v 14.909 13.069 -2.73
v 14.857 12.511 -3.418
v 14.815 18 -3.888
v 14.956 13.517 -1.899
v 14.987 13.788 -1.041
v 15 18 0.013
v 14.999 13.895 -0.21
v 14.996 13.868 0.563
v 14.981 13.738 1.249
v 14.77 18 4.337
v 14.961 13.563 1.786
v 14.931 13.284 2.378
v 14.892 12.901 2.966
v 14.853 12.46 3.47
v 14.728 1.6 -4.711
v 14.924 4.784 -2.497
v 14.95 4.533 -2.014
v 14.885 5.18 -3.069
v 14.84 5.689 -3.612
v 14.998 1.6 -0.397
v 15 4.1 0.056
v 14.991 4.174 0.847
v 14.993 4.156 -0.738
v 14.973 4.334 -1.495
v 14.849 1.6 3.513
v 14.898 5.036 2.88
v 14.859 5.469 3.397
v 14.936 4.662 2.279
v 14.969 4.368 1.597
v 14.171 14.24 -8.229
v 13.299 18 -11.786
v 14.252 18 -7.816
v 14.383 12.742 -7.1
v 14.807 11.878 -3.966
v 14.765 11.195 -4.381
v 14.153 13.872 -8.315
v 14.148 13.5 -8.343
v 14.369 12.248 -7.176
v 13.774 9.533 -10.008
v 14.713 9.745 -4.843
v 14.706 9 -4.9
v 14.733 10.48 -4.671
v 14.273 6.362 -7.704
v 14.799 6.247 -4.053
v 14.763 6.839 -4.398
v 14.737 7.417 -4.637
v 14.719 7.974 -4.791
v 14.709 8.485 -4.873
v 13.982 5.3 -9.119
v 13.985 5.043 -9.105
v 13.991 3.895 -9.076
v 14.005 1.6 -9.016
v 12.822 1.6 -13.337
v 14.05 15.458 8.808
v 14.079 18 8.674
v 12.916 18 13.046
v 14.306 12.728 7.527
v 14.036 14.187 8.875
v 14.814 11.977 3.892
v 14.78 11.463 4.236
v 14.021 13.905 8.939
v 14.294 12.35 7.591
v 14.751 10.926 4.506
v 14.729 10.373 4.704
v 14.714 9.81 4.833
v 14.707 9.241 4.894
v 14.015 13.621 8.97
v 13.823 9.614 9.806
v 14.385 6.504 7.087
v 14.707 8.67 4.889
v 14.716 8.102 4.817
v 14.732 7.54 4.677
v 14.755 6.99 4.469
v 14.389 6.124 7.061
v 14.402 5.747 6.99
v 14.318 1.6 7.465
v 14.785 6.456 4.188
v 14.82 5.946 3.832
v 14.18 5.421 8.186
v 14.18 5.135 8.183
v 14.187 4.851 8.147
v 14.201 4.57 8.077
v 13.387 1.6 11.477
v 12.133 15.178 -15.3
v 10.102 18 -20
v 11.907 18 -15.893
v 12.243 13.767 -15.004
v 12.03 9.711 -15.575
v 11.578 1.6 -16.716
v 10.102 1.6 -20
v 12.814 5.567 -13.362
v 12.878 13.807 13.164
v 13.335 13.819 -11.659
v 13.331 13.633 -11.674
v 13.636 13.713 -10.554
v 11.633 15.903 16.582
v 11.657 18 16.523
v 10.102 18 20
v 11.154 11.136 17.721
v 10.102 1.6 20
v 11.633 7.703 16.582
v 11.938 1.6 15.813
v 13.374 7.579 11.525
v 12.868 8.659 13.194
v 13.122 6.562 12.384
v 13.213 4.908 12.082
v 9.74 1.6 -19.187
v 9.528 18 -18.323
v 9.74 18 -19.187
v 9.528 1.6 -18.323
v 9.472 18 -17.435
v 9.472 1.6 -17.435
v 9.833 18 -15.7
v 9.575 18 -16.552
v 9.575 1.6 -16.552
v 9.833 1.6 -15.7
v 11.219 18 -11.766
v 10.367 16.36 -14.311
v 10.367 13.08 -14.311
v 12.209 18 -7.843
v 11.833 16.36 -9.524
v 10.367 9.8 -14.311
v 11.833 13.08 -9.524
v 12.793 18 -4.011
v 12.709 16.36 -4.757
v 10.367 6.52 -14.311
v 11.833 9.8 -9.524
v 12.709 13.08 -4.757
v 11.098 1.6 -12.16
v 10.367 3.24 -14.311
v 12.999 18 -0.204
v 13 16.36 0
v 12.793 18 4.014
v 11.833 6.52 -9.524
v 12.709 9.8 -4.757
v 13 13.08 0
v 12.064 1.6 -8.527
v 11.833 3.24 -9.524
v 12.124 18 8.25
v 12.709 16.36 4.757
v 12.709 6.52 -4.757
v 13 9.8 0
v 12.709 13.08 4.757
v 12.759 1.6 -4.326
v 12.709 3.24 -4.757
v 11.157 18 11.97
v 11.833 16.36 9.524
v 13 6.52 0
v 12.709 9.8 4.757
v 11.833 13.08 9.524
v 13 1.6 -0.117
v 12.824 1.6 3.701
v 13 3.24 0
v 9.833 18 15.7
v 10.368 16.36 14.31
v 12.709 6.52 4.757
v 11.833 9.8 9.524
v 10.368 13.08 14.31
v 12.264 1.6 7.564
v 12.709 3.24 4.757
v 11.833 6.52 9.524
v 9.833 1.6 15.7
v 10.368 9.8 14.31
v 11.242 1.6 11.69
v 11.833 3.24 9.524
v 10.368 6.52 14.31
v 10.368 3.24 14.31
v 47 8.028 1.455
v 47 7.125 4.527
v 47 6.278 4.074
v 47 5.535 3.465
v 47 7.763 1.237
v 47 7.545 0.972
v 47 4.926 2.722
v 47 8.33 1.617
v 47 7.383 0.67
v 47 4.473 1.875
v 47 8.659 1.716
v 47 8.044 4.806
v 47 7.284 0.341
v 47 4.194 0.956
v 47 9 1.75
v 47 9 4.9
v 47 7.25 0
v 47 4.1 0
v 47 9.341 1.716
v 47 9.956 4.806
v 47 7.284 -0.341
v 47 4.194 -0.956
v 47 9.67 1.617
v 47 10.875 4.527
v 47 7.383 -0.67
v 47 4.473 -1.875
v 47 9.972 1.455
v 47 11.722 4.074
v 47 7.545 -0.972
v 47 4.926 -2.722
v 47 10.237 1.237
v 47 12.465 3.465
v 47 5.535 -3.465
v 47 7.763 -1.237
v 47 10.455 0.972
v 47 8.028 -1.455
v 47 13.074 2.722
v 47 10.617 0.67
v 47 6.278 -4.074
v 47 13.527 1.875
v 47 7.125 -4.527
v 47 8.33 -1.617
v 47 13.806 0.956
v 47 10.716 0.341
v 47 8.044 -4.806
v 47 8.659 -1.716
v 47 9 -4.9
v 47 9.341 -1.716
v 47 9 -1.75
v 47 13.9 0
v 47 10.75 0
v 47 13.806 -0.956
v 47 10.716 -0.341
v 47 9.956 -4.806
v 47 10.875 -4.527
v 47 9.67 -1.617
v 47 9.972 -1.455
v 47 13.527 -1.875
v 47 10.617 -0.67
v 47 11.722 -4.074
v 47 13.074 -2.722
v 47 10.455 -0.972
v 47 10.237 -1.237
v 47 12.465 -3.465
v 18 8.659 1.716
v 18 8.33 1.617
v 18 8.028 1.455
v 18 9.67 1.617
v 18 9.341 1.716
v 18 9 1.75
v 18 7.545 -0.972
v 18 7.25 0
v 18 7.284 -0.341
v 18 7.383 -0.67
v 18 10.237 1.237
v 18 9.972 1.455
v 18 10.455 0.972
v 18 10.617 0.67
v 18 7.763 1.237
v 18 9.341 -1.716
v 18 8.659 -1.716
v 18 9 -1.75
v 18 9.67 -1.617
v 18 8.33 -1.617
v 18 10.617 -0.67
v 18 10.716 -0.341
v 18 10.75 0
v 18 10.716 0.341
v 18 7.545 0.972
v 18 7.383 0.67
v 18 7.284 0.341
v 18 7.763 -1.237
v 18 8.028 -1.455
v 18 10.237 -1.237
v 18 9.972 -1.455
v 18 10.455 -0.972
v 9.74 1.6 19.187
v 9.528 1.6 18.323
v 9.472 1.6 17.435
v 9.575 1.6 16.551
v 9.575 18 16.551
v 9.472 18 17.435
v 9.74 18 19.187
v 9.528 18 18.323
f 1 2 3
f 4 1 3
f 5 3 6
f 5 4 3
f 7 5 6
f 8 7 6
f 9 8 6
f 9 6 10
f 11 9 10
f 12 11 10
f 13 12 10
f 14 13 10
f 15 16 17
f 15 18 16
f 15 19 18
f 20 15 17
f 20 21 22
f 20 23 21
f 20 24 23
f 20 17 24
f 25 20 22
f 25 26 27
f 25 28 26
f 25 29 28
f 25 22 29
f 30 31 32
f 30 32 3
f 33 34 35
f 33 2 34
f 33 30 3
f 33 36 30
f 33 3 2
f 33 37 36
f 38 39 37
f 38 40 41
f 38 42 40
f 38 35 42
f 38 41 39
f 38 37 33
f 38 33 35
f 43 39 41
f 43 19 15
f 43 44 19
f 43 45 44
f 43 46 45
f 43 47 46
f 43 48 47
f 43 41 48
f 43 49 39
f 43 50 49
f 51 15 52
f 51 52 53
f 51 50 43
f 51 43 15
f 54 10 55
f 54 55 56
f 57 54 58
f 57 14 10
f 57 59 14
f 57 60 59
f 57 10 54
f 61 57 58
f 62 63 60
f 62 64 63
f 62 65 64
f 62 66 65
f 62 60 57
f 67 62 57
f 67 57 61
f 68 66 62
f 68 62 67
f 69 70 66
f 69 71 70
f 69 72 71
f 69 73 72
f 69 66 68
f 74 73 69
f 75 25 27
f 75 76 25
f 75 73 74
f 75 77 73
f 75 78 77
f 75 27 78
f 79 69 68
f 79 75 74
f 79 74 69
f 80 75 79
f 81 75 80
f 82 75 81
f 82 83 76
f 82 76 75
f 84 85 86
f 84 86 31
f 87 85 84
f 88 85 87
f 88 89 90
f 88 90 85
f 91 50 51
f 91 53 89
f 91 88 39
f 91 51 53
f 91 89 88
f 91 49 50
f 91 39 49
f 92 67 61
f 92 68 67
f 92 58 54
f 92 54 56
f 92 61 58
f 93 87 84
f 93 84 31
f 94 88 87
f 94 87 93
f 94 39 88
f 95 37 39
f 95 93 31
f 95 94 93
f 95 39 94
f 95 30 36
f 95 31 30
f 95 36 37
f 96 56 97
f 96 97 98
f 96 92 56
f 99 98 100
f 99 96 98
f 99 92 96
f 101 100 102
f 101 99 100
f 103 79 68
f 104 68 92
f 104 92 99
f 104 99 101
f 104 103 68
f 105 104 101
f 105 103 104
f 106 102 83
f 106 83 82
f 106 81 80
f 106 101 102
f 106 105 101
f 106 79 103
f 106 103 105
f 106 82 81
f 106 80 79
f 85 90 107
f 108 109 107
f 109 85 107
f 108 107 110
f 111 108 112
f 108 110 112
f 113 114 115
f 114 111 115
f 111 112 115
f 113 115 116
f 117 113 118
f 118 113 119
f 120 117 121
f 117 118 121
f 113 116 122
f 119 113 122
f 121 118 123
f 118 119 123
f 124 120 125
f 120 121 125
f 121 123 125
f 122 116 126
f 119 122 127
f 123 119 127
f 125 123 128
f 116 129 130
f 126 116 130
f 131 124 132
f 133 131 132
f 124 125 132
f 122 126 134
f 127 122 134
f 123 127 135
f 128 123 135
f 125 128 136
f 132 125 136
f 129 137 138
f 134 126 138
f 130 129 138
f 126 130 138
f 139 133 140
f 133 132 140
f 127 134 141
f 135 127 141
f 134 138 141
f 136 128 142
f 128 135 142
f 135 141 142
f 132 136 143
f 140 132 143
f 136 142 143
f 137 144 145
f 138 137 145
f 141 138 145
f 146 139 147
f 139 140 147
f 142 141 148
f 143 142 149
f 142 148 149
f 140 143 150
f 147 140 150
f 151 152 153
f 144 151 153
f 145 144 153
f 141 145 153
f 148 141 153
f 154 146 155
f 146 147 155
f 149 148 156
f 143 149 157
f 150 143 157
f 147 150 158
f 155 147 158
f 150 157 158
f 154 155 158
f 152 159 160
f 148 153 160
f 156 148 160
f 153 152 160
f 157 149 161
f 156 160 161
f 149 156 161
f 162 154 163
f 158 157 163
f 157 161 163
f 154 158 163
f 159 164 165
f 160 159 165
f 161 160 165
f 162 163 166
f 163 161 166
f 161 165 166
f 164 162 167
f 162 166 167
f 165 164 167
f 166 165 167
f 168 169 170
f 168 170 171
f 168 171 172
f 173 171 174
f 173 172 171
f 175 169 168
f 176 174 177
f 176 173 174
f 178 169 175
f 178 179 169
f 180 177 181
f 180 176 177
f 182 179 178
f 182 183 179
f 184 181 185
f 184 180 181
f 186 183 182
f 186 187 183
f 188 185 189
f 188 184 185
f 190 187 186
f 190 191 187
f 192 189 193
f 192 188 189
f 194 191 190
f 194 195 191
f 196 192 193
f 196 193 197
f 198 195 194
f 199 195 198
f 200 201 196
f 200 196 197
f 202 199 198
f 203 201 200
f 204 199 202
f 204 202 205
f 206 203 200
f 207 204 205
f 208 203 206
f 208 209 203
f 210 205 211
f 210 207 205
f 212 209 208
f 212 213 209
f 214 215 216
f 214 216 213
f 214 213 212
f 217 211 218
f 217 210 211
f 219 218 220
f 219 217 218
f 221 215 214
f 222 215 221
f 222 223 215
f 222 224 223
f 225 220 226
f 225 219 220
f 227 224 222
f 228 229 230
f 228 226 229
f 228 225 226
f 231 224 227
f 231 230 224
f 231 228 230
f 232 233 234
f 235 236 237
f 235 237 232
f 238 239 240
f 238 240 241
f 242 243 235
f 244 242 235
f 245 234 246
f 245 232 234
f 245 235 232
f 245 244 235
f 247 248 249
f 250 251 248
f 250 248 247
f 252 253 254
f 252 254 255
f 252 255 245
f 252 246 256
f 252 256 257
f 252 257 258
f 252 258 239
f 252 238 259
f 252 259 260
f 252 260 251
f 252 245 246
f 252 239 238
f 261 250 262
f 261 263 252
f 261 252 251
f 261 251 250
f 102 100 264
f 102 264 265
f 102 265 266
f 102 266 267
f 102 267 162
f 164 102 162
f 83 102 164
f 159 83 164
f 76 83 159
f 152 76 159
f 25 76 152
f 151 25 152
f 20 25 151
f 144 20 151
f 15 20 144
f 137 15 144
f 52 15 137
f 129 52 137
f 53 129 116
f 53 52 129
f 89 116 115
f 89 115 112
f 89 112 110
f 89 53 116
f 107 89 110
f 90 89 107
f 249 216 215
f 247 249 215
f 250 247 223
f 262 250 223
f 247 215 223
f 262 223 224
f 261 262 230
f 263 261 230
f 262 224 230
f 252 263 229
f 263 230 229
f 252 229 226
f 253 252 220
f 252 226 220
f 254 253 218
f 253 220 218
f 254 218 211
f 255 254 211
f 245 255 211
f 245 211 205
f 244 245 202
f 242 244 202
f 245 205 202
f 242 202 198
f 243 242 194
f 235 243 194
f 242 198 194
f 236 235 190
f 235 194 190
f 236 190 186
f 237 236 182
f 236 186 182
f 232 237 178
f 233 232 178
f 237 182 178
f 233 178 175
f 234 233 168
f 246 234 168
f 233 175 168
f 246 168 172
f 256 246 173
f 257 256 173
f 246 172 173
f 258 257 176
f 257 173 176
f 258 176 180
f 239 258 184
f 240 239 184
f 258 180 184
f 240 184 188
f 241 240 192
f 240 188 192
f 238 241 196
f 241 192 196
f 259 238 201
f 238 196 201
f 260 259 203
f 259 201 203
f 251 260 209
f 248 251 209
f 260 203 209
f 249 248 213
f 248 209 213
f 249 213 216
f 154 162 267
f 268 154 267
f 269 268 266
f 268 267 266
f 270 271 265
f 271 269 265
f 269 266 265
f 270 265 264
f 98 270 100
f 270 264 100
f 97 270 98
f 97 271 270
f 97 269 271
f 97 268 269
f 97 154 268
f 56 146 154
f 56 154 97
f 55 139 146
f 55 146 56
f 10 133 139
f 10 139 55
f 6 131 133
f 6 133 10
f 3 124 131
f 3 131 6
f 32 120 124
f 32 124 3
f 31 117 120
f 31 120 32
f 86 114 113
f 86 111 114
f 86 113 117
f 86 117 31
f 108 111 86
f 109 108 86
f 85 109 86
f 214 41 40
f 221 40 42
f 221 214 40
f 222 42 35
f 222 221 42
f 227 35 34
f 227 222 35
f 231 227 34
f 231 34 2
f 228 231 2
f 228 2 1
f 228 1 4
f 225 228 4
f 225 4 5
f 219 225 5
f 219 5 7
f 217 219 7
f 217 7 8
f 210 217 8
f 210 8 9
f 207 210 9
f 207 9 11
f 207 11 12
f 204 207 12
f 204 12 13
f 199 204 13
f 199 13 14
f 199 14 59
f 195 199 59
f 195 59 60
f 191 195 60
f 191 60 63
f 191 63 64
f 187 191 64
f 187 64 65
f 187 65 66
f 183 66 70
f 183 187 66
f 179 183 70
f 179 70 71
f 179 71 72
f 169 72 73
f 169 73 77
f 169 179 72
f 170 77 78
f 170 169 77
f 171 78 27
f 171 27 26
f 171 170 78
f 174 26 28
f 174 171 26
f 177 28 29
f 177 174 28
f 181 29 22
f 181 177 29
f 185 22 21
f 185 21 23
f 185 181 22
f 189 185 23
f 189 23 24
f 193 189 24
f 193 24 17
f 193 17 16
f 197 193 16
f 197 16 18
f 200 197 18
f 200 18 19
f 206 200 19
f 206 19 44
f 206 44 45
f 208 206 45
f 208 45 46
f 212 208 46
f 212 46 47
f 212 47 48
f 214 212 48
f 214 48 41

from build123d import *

# Parameters (mm, degrees)
BOSS_EXTRUDE1_DEPTH = 18
BOSS_EXTRUDE2_REACH = 30.6
SKETCH2_R           = 4.9
BOSS_EXTRUDE3_START = 29
SKETCH3_R           = 4.9
BOSS_EXTRUDE3_DEPTH = 29
SKETCH4_R           = 1.75
CUT_EXTRUDE1_DEPTH  = 29
SKETCH5_W           = 40.000265569
SKETCH5_H           = 1.6
CUT_EXTRUDE2_DEPTH  = 40
FILLET1_R           = 5


with BuildPart() as part:
    # Sketch1 → Boss-Extrude1 (new body)
    with BuildSketch(Plane(origin=(0, 0, 0), x_dir=(1, 0, 0), z_dir=(0, 1, 0))):
        with BuildLine():
            Line((8.3059154, -19.120265102), (10.102040816, -20))
            add(Edge.make_bspline(
                [(10.101910741, 20.000265569), (13.36730358, 13.333510379), (16.63267474, 8.8523e-05), (13.367346939, -13.333333333), (10.102040816, -20)],
                knots=[0.21428192, 0.21428192, 0.21428192, 0.21428192, 0.5, 0.785714286, 0.785714286, 0.785714286, 0.785714286], degree=3))
            Line((10.101910741, 20.000265569), (8.30578994, 19.12052125))
            add(Edge.make_bspline(
                [(8.30578994, 19.12052125), (8.694326407, 18.327269829), (9.438931208, 16.706587132), (10.709549512, 13.511731918), (11.931546391, 9.520297592), (12.805878251, 4.755507519), (13.097053142, 0.000126231), (12.80590918, -4.755254756), (11.931608442, -9.520044011), (10.709637835, -13.511477312), (9.43904063, -16.706331706), (8.694446639, -18.327013824), (8.3059154, -19.120265102)],
                knots=[0.21428192, 0.21428192, 0.21428192, 0.21428192, 0.249996443, 0.285710966, 0.357140012, 0.428569057, 0.499998103, 0.571427149, 0.642856194, 0.71428524, 0.749999763, 0.785714286, 0.785714286, 0.785714286, 0.785714286], degree=3))
        make_face()
    extrude(amount=BOSS_EXTRUDE1_DEPTH)

    # Sketch2 → Boss-Extrude2 (add, up to next)
    with BuildSketch(Plane(origin=(18, 0, 0), x_dir=(0, 0, -1), z_dir=(1, 0, 0)), mode=Mode.PRIVATE) as boss_extrude2_sk1:
        with Locations((0, 9)):
            Circle(SKETCH2_R)
    boss_extrude2_tool1 = extrude(boss_extrude2_sk1.sketch, amount=-BOSS_EXTRUDE2_REACH, mode=Mode.PRIVATE) - part.part
    add(boss_extrude2_tool1.solids().sort_by_distance((18, 9, 0))[0])

    # Sketch3 → Boss-Extrude3 (add)
    with BuildSketch(Plane(origin=(18, 0, 0), x_dir=(0, 0, -1), z_dir=(1, 0, 0)).offset(BOSS_EXTRUDE3_START)):
        with Locations((0, 9)):
            Circle(SKETCH3_R)
    extrude(amount=-BOSS_EXTRUDE3_DEPTH)

    # Sketch4 → Cut-Extrude1 (cut)
    with BuildSketch(Plane(origin=(47, 0, 0), x_dir=(0, 0, -1), z_dir=(1, 0, 0))):
        with Locations((0, 9)):
            Circle(SKETCH4_R)
    extrude(amount=-CUT_EXTRUDE1_DEPTH, mode=Mode.SUBTRACT)

    # Sketch5 → Cut-Extrude2 (cut)
    with BuildSketch(Plane(origin=(47, 0, 0), x_dir=(0, 0, -1), z_dir=(1, 0, 0))):
        with Locations((0.000132784, 0.8)):
            Rectangle(SKETCH5_W, SKETCH5_H)
    extrude(amount=-CUT_EXTRUDE2_DEPTH, mode=Mode.SUBTRACT)

    # Fillet1
    # the kernel refuses this fillet: 5 mm, written as the material it takes off along each edge
    with BuildSketch(Plane(origin=(8.30578994, -7.764782929, -19.12052125), x_dir=(0.4075991497748225, 0, 0.9131609568432292), z_dir=(0, 1, 0))) as fillet1_piece_1:
        with BuildLine():
            CenterArc((3.930348167, 4.996597215), FILLET1_R, 216.83934776, 51.046703295)
            Line((-0.071250852, 1.998730426), (-0.151282833, 1.93877309))
            ThreePointArc((-0.151282833, 1.93877309), (-0.135561948, 0.99580267), (-0.099936521, -0.003562543))
            Line((-0.099936521, -0.003562543), (0.003562543, -0.099936521))
            ThreePointArc((0.003562543, -0.099936521), (1.872980998, -0.066213211), (3.742224472, -0.099931944))
            Line((3.742224472, -0.099931944), (3.745913172, 0))
        make_face()
    extrude(amount=35.129565858, mode=Mode.SUBTRACT)
    with BuildSketch(Plane(origin=(8.3059154, -7.764778421, 19.120265102), x_dir=(0.8980627079890215, 0, 0.4398674488063712), z_dir=(0, 1, 0))) as fillet1_piece_2:
        with BuildLine():
            CenterArc((4.853404013, 4.105859902), FILLET1_R, 184.155597401, 51.046688752)
            Line((-0.133450663, 3.743533478), (-0.233187757, 3.736286949))
            ThreePointArc((-0.233187757, 3.736286949), (-0.132897152, 1.869432253), (-0.1, 0))
            Line((-0.1, 0), (0, -0.1))
            ThreePointArc((0, -0.1), (1, -0.1), (1.94293192, -0.082117198))
            Line((1.94293192, -0.082117198), (2, 0))
        make_face()
    extrude(amount=35.129556842, mode=Mode.SUBTRACT)


solid = part.part
